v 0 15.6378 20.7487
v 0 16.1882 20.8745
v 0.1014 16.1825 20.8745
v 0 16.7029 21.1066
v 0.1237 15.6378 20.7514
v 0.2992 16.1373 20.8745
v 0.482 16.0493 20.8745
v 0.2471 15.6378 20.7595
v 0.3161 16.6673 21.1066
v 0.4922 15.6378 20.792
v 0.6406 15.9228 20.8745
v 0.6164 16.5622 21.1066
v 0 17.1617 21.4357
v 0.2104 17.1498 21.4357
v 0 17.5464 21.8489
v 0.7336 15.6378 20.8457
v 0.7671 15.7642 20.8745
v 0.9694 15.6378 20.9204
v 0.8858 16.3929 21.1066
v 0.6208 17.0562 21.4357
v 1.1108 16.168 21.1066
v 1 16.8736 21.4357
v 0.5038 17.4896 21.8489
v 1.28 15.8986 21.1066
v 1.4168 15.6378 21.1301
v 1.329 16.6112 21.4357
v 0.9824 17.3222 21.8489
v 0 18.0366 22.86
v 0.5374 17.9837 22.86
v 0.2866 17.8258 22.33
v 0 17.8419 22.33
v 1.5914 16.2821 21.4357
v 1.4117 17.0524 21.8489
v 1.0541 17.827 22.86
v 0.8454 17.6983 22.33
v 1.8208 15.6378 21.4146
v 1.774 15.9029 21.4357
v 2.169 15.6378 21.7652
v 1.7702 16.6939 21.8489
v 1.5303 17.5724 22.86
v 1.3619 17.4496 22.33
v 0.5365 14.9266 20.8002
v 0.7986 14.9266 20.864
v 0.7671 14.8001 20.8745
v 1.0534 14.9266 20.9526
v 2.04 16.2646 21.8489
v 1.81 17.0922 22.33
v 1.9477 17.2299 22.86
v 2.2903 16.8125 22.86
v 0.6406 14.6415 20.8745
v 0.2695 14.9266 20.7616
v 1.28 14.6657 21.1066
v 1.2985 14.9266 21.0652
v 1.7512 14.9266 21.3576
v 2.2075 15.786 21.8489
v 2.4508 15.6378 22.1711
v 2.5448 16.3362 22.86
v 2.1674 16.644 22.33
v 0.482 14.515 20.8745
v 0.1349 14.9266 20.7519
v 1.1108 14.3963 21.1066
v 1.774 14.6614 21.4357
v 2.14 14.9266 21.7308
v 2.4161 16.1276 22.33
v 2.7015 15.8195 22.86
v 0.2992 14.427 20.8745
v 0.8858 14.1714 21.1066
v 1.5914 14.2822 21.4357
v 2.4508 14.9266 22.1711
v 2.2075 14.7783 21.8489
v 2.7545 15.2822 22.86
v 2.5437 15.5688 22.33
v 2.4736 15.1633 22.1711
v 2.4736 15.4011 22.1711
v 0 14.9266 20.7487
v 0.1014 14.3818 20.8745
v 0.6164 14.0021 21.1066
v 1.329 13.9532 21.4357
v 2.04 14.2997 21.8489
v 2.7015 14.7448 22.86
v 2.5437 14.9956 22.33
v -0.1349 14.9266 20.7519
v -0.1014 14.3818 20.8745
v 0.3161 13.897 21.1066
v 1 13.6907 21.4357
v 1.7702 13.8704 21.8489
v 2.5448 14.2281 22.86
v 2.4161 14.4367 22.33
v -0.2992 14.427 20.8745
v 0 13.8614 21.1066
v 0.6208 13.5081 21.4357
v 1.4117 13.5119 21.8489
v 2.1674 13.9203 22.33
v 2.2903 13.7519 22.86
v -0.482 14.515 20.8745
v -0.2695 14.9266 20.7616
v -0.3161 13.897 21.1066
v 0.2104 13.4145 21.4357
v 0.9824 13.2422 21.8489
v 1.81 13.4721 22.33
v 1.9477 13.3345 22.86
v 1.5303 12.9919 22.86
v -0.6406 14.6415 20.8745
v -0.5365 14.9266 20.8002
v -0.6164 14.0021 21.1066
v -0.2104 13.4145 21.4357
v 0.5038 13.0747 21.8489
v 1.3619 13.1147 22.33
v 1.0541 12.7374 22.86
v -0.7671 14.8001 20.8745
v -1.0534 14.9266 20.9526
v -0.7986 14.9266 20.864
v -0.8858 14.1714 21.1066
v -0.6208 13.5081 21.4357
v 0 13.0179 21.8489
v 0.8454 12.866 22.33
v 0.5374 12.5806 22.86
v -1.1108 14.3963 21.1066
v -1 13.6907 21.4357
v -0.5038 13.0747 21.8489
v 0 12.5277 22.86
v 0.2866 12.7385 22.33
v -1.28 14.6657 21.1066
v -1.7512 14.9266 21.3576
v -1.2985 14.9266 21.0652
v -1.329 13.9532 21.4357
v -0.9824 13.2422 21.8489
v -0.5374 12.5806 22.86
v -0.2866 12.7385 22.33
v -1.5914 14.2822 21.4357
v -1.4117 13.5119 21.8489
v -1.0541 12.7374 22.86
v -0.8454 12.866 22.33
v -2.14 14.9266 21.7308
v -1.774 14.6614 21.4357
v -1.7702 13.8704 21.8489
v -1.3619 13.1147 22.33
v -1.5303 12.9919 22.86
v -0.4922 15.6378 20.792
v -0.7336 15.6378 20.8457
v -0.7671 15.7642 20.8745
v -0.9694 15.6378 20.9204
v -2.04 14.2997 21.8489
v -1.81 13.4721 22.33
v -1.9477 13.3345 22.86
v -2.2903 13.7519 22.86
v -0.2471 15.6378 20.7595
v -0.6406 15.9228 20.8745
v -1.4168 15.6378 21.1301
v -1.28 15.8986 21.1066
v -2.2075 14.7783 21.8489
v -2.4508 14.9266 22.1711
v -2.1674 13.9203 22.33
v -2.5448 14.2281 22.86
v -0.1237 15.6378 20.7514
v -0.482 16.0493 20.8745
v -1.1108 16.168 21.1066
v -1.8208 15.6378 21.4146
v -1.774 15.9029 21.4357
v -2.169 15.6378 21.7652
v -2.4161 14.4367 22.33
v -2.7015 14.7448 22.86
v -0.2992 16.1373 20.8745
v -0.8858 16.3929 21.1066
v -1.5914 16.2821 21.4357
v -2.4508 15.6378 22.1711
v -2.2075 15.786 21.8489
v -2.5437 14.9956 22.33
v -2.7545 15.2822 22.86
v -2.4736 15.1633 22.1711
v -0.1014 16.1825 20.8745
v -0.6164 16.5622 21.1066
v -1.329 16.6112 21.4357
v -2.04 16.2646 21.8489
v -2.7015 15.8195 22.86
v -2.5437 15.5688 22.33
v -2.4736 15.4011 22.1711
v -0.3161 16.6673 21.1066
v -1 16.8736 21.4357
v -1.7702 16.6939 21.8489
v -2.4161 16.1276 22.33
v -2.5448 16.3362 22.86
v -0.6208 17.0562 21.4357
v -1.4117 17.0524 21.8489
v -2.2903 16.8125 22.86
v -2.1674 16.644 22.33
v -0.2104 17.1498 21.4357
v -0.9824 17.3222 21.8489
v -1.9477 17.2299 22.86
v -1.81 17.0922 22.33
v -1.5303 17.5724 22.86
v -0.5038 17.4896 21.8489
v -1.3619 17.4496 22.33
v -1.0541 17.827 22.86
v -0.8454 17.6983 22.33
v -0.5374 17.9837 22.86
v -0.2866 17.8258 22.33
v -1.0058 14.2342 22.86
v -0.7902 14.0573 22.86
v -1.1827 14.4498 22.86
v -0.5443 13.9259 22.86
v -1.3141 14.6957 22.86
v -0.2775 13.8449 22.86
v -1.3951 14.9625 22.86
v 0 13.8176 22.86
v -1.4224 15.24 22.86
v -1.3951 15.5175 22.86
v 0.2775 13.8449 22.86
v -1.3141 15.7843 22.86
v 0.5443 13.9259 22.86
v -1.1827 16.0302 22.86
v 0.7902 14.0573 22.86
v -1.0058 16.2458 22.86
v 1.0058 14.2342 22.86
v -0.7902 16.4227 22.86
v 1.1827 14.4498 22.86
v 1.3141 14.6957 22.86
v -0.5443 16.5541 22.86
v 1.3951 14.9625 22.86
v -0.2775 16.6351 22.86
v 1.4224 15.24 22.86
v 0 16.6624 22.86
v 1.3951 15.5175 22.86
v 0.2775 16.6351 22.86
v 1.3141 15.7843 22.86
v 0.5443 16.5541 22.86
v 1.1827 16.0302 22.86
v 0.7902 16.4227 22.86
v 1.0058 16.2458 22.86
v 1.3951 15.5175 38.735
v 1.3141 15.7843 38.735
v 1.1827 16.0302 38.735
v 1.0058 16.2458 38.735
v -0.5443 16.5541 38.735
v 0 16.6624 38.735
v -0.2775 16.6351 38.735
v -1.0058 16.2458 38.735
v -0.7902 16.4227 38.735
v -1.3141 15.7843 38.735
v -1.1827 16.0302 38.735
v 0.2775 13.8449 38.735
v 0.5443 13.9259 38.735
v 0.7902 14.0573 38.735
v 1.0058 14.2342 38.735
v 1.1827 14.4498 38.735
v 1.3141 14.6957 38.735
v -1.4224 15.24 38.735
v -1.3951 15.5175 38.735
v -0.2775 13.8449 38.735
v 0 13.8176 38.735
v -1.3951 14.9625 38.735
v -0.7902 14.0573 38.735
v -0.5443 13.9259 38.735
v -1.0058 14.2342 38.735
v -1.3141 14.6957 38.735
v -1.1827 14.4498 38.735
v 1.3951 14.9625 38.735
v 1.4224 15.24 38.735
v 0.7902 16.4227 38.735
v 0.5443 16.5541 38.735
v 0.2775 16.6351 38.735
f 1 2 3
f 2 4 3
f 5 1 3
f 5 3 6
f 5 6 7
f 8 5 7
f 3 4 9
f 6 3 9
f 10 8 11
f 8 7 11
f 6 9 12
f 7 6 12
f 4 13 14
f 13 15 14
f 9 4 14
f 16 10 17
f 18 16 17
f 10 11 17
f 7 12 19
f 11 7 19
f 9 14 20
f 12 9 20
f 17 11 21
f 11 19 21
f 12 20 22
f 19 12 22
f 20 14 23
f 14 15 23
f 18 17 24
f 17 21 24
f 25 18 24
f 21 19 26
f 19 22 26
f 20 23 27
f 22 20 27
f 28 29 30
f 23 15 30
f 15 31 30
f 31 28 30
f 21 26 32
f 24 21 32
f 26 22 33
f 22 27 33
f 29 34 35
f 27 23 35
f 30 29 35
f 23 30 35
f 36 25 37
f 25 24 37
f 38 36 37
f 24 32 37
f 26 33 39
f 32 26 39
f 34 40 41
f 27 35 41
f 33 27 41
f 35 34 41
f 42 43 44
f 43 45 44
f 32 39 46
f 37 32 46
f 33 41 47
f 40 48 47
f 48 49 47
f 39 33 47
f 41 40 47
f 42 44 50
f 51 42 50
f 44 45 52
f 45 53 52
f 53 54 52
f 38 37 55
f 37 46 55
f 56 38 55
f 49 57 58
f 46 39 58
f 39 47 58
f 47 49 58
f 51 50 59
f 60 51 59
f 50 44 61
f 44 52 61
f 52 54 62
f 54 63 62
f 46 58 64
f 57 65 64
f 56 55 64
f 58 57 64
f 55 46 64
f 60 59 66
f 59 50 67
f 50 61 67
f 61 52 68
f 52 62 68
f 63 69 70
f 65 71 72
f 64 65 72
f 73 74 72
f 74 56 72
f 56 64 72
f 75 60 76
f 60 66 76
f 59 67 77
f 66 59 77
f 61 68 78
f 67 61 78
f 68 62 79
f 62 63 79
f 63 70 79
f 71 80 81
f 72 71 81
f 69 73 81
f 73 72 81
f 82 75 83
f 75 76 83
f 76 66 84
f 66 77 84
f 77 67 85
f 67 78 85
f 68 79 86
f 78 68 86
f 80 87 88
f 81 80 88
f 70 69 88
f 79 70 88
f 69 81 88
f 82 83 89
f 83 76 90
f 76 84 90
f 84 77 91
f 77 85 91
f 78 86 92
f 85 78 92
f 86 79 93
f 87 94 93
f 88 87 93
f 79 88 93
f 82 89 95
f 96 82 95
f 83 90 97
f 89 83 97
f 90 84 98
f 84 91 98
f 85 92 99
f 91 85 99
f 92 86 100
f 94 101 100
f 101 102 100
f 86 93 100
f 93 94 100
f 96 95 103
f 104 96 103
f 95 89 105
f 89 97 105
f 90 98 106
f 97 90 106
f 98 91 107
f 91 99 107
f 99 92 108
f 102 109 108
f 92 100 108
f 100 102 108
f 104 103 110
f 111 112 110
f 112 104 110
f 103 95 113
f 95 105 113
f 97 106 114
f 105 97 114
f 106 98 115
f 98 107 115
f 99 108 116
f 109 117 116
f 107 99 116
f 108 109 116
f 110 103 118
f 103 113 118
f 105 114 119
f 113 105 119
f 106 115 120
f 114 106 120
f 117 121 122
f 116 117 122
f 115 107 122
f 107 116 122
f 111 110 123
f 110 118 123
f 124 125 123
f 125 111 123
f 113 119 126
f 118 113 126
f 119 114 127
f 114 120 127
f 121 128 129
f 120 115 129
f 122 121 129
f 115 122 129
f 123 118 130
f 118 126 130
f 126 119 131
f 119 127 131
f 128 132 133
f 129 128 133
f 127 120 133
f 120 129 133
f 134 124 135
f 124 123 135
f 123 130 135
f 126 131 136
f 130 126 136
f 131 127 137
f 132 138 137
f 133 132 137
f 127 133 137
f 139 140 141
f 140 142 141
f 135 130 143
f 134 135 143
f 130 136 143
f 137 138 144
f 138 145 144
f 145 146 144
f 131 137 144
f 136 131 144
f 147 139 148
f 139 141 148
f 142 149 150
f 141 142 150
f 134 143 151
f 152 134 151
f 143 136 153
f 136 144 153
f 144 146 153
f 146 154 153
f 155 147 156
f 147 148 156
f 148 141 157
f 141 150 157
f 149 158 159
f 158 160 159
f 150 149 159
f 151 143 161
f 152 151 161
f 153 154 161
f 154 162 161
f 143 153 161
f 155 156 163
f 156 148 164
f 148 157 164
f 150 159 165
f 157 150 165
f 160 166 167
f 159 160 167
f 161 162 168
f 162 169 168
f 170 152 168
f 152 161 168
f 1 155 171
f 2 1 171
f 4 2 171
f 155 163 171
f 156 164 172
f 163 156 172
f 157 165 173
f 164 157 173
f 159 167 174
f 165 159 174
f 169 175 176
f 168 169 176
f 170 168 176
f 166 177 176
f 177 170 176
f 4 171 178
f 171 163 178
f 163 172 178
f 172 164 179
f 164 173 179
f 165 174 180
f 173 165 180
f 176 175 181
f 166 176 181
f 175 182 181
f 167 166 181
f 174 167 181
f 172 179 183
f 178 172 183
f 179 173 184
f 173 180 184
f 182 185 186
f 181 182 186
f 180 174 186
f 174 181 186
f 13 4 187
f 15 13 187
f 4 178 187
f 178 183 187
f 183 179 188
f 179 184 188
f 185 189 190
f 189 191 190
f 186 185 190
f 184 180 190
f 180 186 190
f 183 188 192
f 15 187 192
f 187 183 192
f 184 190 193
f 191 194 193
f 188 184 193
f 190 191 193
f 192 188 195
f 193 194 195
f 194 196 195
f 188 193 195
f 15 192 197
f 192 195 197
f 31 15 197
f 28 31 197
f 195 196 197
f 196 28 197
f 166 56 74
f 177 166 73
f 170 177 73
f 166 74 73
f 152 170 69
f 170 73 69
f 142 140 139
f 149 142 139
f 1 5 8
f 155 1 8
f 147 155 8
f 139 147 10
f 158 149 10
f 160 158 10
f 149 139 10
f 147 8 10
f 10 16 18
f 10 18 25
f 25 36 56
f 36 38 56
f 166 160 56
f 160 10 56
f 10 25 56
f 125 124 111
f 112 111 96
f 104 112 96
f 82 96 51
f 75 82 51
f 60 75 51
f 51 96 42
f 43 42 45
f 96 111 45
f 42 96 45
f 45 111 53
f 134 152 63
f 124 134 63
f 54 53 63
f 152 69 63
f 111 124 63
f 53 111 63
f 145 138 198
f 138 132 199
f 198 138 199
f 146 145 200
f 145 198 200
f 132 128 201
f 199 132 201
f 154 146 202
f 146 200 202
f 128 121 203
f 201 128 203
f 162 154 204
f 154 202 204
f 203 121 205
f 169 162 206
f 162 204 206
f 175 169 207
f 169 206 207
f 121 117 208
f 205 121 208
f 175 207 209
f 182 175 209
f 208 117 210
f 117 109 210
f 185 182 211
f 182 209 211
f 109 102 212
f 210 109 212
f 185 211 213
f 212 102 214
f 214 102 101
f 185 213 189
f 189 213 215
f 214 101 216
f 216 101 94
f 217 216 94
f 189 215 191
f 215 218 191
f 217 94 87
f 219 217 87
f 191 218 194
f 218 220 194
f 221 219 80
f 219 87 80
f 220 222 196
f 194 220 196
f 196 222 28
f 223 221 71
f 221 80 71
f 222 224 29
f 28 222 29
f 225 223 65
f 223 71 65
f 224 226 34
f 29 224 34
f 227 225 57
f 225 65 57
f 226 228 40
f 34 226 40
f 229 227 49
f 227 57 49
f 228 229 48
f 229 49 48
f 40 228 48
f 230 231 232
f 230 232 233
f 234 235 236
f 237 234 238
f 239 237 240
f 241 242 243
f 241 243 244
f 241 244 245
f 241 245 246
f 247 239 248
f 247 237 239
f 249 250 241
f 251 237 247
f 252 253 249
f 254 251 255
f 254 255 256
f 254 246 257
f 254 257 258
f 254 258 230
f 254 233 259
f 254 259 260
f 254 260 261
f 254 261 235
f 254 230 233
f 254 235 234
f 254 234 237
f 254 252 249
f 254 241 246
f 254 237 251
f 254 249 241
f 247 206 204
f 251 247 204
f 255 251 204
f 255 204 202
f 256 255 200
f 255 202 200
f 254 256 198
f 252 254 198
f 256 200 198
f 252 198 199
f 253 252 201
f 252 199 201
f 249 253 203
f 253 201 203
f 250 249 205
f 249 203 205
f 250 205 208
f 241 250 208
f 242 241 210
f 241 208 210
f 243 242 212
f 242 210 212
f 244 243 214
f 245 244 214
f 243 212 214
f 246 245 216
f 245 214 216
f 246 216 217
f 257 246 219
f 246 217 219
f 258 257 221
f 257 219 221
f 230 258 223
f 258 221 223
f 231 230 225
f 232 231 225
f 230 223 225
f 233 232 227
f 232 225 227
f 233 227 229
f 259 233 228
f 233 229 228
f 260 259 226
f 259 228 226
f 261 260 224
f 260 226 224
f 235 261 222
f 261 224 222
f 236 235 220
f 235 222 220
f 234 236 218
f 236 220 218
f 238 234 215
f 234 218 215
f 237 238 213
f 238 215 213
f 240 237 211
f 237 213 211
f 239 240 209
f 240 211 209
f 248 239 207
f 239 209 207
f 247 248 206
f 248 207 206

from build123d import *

# Parameters (mm, degrees)
SKETCH2_R           = 1.4224
BOSS_EXTRUDE1_DEPTH = 15.875
CUT_EXTRUDE1_DEPTH  = 43.817135594


with BuildPart() as part:
    # Sketch1 → Base-Revolve (revolve)
    with BuildSketch(Plane(origin=(0, 0, 0), x_dir=(0, 0, -1), z_dir=(1, 0, 0))):
        with BuildLine():
            Line((-22.86, 15.282157927), (-20.7264, 15.282157927))
            ThreePointArc((-20.7264, 15.282157927), (-21.322188128, 17.024235032), (-22.86, 18.036623683))
            Line((-22.86, 18.036623683), (-22.86, 15.282157927))
        make_face()
    revolve(axis=Axis((0, 15.282157927, 28.59405), (0, 0, -1)))

    # Sketch2 → Boss-Extrude1 (add)
    with BuildSketch(Plane.XY.offset(22.86)):
        with Locations(Location((0, 15.24, 0), (0, 0, 180))):
            Circle(SKETCH2_R)
    extrude(amount=BOSS_EXTRUDE1_DEPTH)

    # Sketch4 → Cut-Extrude1 (cut, through all)
    with BuildSketch(Plane(origin=(0, 0, 0), x_dir=(0, 0, -1), z_dir=(1, 0, 0))):
        with BuildLine():
            Line((-22.171112501, 14.926557927), (-20.748712501, 14.926557927))
            ThreePointArc((-20.748712501, 14.926557927), (-20.7264, 15.282157927), (-20.748712501, 15.637757927))
            Line((-20.748712501, 15.637757927), (-22.171112501, 15.637757927))
            Line((-22.171112501, 15.637757927), (-22.171112501, 14.926557927))
        make_face()
    cut_extrude1 = extrude(amount=-CUT_EXTRUDE1_DEPTH, mode=Mode.SUBTRACT)

    # Mirror1: Cut-Extrude1 across plane
    add(cut_extrude1.mirror(Plane(origin=(0, 15.282157927, 23.5712), x_dir=(0, 0, 1), z_dir=(1, 0, 0))), mode=Mode.SUBTRACT)


solid = part.part
